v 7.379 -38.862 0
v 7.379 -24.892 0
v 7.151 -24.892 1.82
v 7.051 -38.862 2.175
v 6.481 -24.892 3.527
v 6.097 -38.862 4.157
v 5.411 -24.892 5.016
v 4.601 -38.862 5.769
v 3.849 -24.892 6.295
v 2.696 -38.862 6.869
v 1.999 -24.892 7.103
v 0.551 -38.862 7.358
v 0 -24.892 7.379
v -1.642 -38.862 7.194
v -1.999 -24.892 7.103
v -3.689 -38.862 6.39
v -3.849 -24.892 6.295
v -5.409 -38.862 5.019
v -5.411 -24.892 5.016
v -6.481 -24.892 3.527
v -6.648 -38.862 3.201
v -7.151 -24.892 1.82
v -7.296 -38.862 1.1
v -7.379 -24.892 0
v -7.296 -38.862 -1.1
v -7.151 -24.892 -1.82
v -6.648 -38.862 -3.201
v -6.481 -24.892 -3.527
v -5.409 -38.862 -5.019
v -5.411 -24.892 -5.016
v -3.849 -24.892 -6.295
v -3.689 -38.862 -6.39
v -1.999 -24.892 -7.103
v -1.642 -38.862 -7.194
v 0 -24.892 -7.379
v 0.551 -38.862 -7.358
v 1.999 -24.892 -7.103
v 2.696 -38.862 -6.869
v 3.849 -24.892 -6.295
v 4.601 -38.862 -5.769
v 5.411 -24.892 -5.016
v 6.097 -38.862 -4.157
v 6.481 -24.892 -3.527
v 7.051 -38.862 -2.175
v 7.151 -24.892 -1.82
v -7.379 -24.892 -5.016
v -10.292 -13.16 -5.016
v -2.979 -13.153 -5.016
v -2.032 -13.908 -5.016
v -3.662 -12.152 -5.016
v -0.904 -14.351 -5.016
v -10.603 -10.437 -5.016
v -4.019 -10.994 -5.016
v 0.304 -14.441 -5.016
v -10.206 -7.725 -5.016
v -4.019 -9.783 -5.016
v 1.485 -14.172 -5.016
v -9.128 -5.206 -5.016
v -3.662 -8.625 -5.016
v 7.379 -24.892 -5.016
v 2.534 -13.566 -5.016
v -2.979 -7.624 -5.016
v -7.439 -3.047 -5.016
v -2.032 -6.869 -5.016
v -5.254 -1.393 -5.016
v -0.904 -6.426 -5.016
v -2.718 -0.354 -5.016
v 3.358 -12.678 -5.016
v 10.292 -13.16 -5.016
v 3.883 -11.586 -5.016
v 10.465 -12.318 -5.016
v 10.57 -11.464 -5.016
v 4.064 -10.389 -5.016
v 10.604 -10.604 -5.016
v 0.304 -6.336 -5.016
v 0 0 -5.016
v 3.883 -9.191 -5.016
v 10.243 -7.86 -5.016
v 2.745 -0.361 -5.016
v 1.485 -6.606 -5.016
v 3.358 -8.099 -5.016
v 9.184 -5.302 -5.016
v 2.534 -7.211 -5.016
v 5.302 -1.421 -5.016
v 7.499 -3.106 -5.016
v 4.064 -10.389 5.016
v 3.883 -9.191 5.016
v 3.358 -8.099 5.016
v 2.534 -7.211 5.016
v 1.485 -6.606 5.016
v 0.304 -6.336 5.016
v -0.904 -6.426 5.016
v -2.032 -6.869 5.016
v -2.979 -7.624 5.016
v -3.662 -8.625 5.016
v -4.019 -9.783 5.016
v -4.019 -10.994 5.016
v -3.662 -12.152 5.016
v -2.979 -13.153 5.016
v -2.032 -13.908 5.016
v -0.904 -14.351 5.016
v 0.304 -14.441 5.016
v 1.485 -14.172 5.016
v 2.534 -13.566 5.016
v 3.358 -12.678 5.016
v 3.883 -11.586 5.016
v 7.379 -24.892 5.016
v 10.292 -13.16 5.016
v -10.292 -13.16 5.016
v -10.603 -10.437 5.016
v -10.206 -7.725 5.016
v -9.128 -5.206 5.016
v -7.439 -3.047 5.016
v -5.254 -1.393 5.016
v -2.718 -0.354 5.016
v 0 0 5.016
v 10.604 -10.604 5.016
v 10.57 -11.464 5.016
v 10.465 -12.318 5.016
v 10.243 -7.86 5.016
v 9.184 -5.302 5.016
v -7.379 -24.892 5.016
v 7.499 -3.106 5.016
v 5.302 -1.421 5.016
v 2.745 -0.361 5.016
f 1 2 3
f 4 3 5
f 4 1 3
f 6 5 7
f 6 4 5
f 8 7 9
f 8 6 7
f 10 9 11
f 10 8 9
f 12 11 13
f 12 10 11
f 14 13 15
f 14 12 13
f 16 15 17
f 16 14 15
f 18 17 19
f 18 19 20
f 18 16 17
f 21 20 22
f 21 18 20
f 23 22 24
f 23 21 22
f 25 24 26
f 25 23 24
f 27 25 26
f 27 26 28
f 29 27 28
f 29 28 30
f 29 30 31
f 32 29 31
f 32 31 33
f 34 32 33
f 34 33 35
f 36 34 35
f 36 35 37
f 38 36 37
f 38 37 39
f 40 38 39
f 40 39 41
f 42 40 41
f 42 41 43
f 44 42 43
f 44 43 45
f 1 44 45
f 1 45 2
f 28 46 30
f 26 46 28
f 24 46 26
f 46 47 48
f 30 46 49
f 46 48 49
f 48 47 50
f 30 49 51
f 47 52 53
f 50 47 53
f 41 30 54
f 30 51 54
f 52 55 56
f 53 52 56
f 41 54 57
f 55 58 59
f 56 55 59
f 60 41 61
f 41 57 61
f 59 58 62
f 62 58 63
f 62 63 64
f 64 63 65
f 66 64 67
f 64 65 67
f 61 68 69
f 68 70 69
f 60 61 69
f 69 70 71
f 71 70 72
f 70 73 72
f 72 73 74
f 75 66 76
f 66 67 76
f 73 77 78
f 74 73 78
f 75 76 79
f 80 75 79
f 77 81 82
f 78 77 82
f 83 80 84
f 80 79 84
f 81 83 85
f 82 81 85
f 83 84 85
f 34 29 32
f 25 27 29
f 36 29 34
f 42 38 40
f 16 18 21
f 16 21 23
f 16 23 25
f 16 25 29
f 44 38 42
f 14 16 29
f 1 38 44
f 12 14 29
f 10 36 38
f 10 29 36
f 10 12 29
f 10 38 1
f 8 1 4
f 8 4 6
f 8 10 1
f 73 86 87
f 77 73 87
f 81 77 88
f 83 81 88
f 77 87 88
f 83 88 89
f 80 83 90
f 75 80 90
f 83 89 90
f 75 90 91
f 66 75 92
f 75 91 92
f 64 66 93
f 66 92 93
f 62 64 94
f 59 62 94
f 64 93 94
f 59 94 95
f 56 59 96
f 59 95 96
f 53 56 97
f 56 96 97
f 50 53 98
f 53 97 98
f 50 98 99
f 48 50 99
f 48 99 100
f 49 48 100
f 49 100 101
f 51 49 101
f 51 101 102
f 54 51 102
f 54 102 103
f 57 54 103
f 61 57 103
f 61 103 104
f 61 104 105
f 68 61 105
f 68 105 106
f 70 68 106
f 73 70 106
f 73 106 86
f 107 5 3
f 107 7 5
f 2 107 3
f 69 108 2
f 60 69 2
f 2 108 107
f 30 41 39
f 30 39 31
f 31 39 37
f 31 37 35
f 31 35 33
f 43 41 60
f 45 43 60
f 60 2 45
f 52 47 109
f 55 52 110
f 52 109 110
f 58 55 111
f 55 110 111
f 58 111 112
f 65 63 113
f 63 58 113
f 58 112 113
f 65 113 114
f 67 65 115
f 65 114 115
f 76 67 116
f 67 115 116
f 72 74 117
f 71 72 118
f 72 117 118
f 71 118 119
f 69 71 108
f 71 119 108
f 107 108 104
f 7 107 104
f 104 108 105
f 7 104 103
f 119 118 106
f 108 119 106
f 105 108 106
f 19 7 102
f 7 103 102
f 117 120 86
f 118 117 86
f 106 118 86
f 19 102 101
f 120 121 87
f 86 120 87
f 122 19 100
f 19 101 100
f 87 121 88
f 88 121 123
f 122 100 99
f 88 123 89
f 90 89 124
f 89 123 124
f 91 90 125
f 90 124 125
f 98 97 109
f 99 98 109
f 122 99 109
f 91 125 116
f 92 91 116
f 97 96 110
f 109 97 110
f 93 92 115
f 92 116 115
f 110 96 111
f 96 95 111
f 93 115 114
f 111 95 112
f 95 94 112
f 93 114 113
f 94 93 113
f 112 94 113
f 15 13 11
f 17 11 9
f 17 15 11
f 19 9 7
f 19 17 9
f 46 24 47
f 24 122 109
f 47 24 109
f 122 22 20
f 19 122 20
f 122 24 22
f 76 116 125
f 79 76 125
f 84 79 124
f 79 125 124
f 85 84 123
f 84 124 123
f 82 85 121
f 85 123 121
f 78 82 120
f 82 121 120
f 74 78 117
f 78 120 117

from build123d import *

# Parameters (mm, degrees)
F0_R     = 12.7
F1_DEPTH = 38.862
F2_R     = 12.7
F2_R_2   = 7.3787
F3_DEPTH = 13.97
F5_DEPTH = 24.892
F6_W     = 1.03275
F6_H     = 24.892
F6_R     = 4.064
F7_DEPTH = 25.4


with BuildPart() as f1:
    # F0 (on Front) → F1 (new body)
    with BuildSketch(Plane.XZ):
        Circle(F0_R)
    extrude(amount=F1_DEPTH)

    # F2 (on face) → F3 (cut)
    with BuildSketch(Plane.XZ.offset(38.862)):
        Circle(F2_R)
        Circle(F2_R_2, mode=Mode.SUBTRACT)
    extrude(amount=-F3_DEPTH, mode=Mode.SUBTRACT)

    # F4 (on face) → F5 (cut)
    with BuildSketch(Plane(origin=(0, 0, 0), x_dir=(-1, 0, 0), z_dir=(0, 1, 0))):
        with BuildLine():
            ThreePointArc((11.66725, 5.0165), (0, 12.7), (-11.66725, 5.0165))
            Line((-11.66725, 5.0165), (11.66725, 5.0165))
        make_face()
        with BuildLine():
            Line((11.66725, -5.0165), (-11.66725, -5.0165))
            ThreePointArc((-11.66725, -5.0165), (0, -12.7), (11.66725, -5.0165))
        make_face()
    extrude(amount=-F5_DEPTH, mode=Mode.SUBTRACT)

    # F6 (on face) → F7 (cut)
    with BuildSketch(Plane.XY.offset(5.0165)):
        with BuildLine():
            Line((-11.66725, 0), (-11.66725, -24.892))
            Line((-11.66725, -24.892), (-7.3787, -24.892))
            Line((-7.3787, -24.892), (-10.291934, -13.160184))
            ThreePointArc((-10.291934, -13.160184), (-8.353358, -4.071749), (0, 0))
            Line((0, 0), (-11.66725, 0))
        make_face()
        with Locations((-12.183625, -12.446)):
            Rectangle(F6_W, F6_H)
        with BuildLine():
            Line((11.66725, 0), (0, 0))
            ThreePointArc((0, 0), (7.498514, -3.105986), (10.6045, -10.6045))
            ThreePointArc((10.6045, -10.6045), (10.526068, -11.891863), (10.291934, -13.160184))
            Line((10.291934, -13.160184), (7.3787, -24.892))
            Line((7.3787, -24.892), (11.66725, -24.892))
            Line((11.66725, -24.892), (11.66725, 0))
        make_face()
        with Locations((12.183625, -12.446)):
            Rectangle(F6_W, F6_H)
        with Locations((0, -10.3886)):
            Circle(F6_R)
    extrude(amount=-F7_DEPTH, mode=Mode.SUBTRACT)


solid = f1.part
